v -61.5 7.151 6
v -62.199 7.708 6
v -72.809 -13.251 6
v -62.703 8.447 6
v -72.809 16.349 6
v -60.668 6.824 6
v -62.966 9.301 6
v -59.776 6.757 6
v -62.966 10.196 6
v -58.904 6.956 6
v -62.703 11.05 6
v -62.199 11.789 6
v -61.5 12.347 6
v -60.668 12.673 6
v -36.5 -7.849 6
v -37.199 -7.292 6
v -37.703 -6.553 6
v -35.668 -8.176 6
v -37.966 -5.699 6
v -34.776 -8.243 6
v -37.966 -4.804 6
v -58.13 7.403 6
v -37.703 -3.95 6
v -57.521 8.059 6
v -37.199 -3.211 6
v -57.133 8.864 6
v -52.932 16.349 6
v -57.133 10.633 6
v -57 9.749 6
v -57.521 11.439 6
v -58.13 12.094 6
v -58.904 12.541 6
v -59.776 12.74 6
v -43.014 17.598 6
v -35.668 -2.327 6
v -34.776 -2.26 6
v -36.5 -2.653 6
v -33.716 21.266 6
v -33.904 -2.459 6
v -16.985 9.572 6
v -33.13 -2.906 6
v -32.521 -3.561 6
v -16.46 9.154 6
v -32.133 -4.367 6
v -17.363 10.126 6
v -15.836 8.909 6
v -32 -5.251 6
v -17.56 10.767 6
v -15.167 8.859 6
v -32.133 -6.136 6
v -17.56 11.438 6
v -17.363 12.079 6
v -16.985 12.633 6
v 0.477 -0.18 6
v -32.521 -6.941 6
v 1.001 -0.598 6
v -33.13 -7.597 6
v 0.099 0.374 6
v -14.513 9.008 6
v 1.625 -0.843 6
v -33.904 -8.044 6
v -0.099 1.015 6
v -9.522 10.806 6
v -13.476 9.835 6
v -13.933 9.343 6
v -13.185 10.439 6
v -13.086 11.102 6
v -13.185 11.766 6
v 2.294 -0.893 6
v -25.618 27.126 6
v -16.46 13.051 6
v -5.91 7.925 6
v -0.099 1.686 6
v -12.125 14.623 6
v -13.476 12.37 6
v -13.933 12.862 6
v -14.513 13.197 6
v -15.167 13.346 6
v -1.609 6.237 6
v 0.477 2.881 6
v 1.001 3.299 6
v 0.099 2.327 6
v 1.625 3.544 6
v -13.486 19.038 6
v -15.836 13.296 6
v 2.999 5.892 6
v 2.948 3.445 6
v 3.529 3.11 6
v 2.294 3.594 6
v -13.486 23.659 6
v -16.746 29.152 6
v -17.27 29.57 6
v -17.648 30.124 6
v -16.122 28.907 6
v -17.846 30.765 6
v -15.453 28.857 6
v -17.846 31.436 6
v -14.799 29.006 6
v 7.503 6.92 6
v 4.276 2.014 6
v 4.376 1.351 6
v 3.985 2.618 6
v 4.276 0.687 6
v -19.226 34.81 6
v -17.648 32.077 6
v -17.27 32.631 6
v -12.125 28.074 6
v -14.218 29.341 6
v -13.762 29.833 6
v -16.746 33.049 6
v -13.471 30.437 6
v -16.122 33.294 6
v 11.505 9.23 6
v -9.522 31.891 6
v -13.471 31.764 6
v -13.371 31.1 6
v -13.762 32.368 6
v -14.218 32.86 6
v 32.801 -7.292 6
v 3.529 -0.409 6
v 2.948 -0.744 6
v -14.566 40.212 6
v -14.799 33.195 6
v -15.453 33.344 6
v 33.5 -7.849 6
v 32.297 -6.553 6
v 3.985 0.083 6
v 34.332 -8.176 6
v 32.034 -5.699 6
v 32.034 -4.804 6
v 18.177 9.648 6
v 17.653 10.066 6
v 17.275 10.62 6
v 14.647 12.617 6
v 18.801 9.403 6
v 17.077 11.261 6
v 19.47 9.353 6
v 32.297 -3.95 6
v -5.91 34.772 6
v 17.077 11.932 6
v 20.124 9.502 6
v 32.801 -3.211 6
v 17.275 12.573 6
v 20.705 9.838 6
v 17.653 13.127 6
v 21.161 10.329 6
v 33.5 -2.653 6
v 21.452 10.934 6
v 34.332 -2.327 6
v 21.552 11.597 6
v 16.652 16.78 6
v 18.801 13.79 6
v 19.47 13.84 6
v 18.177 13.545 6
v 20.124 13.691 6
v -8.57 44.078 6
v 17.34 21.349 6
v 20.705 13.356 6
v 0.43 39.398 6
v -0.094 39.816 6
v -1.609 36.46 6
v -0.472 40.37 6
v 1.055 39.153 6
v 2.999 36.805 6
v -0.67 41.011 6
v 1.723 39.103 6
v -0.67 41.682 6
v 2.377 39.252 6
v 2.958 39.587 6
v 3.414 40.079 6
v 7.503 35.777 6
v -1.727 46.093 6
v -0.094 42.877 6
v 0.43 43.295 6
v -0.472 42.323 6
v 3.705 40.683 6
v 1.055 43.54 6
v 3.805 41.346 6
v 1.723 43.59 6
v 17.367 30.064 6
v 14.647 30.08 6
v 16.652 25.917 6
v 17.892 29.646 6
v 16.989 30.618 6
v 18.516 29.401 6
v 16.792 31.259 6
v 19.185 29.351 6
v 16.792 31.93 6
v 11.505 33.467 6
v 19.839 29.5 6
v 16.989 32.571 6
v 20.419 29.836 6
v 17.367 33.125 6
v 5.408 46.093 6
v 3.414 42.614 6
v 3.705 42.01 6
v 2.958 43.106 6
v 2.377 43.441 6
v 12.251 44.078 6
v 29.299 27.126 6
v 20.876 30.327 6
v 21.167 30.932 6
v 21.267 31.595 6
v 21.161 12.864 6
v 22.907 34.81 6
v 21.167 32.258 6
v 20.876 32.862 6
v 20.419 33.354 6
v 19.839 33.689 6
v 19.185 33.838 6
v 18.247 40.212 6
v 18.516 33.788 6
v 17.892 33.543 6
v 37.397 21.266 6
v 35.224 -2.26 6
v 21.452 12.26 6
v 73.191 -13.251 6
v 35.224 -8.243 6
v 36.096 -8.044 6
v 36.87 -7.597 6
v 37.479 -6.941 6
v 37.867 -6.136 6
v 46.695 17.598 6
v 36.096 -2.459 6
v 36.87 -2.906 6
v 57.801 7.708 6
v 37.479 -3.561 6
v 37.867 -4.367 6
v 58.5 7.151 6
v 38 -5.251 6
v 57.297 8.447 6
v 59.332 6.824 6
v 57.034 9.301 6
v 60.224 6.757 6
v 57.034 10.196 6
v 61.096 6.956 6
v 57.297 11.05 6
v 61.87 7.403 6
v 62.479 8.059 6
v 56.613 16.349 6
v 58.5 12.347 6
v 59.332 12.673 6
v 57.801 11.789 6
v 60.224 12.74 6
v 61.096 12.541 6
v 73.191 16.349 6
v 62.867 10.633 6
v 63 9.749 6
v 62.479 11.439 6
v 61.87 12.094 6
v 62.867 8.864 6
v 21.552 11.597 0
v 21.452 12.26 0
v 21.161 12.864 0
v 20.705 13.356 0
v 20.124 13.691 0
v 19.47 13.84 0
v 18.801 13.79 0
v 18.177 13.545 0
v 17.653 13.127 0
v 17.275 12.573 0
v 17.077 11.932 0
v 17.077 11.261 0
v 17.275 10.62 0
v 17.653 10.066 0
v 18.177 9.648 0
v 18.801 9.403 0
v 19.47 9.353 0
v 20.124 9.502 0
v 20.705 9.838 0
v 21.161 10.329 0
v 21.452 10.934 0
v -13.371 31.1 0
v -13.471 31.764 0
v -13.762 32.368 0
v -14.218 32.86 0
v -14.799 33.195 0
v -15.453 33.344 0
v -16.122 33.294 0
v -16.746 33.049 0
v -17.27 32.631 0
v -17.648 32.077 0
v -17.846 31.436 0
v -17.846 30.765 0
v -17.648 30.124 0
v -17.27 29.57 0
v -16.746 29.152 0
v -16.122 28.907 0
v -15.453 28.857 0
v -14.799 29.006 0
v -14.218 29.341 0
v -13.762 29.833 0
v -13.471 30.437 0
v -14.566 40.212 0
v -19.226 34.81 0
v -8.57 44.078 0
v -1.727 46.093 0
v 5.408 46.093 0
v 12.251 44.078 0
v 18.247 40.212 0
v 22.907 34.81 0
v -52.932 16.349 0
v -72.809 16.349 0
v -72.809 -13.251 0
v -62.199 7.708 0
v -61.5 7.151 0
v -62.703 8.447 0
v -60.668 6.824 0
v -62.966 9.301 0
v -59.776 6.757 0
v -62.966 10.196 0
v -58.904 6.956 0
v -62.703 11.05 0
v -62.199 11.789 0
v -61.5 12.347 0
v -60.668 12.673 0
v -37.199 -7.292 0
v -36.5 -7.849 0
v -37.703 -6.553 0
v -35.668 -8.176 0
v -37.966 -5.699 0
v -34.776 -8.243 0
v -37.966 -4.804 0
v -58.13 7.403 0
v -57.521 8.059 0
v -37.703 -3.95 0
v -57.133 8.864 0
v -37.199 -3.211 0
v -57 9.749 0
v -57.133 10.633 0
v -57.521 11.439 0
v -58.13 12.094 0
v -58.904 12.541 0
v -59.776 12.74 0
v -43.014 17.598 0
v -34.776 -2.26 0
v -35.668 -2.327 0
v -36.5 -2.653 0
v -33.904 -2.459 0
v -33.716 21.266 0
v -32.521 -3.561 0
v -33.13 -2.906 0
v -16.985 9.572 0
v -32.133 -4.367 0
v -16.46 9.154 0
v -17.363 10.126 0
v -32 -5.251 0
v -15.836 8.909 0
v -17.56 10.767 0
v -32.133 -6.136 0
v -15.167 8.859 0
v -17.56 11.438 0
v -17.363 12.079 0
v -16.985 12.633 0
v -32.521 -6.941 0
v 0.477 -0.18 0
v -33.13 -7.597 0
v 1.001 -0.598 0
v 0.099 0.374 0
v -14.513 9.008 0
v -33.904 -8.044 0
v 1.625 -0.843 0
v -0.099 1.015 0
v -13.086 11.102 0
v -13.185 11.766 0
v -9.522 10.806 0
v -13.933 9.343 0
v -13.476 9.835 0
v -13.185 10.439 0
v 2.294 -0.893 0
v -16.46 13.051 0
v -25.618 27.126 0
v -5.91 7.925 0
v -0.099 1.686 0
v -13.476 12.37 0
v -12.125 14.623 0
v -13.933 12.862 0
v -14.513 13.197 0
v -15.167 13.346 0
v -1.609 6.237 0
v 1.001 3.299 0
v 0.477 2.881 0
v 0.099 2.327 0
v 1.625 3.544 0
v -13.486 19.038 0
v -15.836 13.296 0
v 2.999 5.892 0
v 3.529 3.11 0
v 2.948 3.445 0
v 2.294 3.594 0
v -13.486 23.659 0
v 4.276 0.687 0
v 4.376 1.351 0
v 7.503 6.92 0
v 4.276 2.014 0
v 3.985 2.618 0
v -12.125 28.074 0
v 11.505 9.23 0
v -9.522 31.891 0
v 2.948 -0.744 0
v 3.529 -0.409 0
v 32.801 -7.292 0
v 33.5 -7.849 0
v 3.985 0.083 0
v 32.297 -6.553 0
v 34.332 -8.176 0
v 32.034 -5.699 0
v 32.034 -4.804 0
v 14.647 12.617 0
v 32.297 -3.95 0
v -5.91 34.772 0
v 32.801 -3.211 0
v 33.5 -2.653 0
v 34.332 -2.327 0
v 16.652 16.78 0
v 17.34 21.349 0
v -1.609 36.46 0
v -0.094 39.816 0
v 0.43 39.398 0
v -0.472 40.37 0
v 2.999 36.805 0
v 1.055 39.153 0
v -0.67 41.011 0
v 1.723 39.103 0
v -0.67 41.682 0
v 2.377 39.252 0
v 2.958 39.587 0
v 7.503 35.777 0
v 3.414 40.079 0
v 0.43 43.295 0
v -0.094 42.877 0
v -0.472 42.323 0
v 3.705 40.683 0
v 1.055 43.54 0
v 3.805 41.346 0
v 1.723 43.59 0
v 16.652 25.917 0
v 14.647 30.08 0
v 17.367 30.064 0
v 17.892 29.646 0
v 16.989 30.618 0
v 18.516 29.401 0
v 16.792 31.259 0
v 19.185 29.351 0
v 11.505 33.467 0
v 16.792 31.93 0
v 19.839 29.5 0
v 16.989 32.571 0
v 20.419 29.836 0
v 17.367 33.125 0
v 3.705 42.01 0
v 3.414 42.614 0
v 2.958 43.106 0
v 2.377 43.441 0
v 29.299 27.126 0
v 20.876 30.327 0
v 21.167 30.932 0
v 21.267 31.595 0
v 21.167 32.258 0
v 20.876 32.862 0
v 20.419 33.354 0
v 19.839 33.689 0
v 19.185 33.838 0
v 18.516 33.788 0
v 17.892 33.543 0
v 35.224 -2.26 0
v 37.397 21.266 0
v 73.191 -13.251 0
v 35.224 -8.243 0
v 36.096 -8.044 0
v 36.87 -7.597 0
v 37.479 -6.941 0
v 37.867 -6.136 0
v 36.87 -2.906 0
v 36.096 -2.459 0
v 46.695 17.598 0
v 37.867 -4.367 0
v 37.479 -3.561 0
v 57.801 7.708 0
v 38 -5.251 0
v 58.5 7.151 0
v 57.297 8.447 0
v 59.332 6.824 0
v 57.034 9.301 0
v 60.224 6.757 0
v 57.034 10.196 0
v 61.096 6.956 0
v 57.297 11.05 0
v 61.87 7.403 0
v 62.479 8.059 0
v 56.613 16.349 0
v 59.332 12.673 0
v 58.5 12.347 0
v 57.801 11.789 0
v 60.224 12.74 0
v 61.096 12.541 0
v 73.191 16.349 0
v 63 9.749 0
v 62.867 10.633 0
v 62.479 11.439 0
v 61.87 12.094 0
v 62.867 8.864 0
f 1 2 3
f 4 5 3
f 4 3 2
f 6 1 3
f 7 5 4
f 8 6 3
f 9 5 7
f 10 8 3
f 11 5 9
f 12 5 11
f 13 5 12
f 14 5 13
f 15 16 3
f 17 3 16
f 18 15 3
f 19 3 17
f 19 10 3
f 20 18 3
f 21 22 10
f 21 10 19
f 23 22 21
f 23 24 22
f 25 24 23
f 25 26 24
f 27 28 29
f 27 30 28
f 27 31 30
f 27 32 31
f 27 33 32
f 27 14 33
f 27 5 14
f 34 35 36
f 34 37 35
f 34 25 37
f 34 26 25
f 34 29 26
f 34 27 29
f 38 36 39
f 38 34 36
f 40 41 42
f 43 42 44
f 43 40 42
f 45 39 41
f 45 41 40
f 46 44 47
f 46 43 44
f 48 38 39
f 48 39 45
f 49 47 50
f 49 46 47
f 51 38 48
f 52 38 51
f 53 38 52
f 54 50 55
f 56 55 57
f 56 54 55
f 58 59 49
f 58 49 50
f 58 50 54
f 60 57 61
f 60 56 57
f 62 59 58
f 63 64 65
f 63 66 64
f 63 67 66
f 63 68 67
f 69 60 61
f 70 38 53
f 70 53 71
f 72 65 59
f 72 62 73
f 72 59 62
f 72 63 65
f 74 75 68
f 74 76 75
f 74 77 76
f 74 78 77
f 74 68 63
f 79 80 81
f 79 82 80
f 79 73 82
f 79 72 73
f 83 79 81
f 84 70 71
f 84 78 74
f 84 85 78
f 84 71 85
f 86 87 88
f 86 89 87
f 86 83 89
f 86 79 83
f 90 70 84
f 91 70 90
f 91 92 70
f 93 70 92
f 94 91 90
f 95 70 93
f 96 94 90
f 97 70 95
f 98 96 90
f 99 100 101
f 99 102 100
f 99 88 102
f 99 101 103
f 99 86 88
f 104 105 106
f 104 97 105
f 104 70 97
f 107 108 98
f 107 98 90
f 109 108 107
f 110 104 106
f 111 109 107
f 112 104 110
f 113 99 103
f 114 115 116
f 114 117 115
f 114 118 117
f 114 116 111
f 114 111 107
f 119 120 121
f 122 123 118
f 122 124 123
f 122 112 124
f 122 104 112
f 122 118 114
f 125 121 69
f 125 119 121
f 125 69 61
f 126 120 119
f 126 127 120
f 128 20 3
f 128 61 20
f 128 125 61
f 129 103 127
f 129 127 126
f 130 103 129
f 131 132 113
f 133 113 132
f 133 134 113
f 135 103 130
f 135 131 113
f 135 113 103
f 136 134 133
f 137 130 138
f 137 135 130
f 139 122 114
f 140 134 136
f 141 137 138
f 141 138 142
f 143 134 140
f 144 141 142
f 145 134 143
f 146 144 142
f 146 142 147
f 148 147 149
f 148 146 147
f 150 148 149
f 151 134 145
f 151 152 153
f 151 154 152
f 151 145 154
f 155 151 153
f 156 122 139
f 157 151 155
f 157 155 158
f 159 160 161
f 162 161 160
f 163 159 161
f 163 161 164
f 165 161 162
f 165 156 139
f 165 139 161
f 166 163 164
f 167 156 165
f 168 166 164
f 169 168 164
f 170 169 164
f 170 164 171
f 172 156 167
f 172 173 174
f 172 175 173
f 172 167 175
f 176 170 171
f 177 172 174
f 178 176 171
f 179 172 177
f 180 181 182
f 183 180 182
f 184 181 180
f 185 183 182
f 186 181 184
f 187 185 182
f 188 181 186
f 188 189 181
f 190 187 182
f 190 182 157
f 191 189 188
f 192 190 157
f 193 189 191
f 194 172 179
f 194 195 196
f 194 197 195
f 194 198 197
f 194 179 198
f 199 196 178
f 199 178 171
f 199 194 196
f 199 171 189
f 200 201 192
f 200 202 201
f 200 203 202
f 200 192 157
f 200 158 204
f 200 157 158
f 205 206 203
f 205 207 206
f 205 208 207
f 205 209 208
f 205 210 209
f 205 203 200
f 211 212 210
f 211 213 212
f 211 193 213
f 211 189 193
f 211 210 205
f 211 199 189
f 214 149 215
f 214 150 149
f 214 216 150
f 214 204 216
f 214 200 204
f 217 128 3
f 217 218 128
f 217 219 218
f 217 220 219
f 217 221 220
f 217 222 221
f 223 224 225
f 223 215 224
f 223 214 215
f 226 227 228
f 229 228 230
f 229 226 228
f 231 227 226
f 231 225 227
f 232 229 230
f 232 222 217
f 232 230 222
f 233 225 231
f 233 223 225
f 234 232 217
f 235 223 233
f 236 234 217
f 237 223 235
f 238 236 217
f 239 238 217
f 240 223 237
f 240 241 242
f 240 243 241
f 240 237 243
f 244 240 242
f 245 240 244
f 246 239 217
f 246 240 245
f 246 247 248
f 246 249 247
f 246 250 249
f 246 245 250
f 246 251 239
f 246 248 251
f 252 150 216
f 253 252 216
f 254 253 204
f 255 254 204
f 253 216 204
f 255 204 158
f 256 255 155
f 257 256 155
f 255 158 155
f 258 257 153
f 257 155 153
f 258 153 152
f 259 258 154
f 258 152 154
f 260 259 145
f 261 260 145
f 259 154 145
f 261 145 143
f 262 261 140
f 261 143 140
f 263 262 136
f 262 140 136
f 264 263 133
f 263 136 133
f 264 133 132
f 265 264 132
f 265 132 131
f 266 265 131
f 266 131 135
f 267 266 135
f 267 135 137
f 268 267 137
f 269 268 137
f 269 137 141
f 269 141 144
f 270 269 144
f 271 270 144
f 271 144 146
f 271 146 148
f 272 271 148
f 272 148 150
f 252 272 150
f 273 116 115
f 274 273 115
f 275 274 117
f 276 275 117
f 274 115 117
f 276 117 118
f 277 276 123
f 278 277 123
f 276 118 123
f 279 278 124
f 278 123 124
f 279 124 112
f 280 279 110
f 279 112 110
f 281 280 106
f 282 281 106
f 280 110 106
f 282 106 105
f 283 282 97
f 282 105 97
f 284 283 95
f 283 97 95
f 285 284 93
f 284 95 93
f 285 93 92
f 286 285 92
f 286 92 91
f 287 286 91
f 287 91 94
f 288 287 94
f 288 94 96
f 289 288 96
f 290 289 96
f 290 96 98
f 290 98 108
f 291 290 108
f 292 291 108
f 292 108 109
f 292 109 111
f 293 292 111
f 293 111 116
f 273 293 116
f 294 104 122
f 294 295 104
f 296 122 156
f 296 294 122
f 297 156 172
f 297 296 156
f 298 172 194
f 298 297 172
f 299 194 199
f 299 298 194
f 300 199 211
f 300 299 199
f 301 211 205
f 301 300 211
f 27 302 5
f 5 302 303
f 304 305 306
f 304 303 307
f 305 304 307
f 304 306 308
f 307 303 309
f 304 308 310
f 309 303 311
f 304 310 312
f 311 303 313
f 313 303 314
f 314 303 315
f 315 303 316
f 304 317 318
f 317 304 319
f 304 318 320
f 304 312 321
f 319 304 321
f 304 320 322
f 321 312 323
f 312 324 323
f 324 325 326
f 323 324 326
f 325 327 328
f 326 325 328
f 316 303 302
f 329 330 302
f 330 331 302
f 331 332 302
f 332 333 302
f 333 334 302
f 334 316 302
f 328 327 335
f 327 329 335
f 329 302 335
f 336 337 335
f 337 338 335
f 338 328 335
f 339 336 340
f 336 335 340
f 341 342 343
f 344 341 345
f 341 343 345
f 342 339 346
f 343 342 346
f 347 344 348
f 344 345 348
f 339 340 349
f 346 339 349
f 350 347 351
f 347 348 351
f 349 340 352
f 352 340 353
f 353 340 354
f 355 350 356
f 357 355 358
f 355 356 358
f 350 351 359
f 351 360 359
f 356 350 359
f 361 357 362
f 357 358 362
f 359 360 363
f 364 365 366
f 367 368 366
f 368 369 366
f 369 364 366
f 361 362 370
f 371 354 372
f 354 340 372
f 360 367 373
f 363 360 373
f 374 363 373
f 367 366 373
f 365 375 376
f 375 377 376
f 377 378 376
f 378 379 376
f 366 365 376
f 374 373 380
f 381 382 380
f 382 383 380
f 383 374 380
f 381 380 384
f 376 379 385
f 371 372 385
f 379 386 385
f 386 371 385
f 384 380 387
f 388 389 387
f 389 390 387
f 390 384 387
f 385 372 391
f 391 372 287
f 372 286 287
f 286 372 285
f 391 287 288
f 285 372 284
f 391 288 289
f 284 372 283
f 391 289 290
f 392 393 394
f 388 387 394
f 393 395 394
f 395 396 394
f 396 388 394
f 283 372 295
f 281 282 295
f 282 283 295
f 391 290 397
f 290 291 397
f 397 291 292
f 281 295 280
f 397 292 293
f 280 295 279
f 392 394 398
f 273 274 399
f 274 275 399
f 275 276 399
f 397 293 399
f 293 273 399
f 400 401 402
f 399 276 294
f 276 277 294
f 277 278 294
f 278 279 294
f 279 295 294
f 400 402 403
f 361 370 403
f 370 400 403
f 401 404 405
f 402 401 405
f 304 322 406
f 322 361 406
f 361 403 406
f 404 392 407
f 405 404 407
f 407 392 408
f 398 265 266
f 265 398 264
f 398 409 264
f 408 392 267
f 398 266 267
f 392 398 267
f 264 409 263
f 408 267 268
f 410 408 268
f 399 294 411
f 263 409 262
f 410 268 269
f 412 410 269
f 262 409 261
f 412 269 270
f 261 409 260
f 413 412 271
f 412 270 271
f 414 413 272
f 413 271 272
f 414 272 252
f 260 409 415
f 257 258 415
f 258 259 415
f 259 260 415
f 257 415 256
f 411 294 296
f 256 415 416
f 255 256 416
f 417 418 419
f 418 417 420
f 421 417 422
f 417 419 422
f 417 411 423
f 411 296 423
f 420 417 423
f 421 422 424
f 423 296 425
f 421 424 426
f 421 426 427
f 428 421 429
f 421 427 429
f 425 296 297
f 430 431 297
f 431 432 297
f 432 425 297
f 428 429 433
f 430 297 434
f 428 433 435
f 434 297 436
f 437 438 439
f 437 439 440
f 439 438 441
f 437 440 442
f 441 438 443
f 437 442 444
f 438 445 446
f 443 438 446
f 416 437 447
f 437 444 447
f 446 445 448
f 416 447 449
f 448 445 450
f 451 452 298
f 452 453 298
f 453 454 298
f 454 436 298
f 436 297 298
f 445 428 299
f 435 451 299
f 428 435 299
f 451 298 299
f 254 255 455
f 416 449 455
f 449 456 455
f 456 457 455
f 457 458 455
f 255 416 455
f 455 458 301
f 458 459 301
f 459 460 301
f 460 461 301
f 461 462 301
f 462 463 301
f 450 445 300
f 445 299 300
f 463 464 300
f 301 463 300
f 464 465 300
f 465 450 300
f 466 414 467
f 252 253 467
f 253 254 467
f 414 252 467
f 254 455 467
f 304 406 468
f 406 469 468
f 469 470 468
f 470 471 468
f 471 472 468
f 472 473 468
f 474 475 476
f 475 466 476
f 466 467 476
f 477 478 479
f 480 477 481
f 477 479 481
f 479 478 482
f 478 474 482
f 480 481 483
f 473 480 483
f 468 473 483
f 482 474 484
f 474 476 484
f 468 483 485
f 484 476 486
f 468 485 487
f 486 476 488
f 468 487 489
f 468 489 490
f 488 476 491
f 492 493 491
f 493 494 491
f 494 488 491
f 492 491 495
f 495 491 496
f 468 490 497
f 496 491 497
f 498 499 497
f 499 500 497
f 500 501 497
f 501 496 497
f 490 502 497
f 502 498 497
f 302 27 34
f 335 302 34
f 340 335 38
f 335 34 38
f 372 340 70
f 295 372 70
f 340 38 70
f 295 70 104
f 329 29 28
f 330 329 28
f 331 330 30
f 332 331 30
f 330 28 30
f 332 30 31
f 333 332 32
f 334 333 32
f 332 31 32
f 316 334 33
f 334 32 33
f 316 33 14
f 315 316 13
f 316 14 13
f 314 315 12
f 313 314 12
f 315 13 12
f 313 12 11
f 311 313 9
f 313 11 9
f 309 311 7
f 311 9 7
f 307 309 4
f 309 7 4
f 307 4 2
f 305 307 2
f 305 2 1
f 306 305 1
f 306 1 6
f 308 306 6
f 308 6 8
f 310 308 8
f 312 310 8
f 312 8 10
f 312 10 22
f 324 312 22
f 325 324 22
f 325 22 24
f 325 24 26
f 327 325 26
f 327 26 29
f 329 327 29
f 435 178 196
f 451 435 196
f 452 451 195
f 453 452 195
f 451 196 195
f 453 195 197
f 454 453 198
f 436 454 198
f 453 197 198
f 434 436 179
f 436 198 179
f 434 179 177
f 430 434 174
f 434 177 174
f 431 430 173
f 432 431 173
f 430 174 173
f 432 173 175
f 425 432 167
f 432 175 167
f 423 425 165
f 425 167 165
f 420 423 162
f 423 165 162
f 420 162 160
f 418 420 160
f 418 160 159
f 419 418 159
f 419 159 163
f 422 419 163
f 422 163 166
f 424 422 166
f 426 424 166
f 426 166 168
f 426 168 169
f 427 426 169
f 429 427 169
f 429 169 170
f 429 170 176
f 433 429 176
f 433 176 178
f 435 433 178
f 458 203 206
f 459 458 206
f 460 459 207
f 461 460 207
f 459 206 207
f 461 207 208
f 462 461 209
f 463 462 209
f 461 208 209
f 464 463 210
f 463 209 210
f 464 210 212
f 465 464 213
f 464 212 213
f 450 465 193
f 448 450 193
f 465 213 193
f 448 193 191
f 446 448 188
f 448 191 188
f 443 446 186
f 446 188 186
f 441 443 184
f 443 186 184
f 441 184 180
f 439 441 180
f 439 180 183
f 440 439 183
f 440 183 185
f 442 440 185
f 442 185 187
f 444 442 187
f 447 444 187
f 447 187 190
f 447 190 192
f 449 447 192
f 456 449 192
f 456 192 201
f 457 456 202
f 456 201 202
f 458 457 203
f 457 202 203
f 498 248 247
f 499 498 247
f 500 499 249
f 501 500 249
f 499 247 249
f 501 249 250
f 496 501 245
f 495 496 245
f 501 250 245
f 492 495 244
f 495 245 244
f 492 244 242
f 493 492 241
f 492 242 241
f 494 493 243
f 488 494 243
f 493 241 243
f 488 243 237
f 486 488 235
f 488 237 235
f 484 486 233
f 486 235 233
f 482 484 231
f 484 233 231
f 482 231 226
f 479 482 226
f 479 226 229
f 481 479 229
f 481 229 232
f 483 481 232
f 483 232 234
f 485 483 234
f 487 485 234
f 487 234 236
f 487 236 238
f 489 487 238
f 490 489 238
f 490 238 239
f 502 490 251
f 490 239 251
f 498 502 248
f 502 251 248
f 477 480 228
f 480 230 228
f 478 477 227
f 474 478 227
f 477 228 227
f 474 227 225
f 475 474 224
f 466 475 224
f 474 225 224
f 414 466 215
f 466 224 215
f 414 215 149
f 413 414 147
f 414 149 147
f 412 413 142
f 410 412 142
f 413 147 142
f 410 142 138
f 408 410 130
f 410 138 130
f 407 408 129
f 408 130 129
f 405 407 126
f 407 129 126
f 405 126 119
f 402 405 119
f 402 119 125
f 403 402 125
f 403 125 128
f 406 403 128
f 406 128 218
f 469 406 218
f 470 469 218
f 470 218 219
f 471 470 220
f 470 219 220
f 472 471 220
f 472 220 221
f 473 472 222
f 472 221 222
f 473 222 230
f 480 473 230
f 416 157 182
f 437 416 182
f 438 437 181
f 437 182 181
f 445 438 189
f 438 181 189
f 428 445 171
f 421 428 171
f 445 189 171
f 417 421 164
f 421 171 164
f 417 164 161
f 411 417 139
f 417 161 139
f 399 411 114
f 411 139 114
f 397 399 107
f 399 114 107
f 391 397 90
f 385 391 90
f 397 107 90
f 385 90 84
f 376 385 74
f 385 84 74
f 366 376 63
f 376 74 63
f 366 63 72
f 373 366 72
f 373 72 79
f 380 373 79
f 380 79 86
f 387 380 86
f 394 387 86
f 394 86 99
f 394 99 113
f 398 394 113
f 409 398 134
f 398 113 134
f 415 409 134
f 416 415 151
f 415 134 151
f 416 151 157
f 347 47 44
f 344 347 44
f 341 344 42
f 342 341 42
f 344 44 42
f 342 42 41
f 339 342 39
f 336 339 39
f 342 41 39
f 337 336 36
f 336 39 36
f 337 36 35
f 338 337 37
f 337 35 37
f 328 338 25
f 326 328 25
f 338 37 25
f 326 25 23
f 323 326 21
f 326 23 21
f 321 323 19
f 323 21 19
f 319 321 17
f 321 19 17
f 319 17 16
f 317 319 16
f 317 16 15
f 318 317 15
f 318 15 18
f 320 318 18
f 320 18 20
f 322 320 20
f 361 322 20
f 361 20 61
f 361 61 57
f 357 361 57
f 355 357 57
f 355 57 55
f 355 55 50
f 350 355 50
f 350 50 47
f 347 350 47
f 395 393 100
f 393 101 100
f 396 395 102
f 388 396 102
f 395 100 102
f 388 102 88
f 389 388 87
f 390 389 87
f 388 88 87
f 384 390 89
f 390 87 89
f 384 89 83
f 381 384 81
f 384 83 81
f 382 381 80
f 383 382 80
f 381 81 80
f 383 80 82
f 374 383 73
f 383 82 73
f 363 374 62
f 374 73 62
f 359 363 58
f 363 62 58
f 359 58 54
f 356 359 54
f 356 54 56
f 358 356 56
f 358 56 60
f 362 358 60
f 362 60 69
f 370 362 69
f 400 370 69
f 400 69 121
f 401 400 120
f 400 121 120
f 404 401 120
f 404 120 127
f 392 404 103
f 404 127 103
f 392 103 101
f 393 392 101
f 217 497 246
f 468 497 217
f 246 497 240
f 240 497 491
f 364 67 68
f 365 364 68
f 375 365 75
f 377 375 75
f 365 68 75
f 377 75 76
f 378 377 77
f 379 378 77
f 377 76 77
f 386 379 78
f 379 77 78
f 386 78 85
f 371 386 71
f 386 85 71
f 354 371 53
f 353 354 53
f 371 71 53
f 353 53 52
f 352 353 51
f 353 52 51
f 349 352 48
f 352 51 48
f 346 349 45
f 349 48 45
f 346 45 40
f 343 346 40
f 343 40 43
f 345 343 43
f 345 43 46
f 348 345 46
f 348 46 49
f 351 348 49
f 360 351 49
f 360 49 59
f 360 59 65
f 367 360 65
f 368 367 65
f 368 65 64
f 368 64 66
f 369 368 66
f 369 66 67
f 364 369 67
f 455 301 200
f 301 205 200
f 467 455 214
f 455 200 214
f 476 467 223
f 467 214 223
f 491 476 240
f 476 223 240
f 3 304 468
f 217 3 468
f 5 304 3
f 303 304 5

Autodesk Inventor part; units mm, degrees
ref_plane "YZ Plane" through (0, 0, 0) normal (1, 0, 0) x (0, 1, 0)
ref_plane "XZ Plane" through (0, 0, 0) normal (0, 1, 0) x (-1, 0, 0)
ref_plane "XY Plane" through (0, 0, 0) normal (0, 0, 1) x (1, 0, 0)
sketch "Sketch1" plane through (0, 0, 0) normal (0, 0, 1) x (1, 0, 0)
  line L0 (-72.8091, 16.3486) -> (-72.8091, -13.2514) projected
  line L1 (-72.8091, -13.2514) -> (73.1909, -13.2514) projected
  line L2 (73.1909, -13.2514) -> (73.1909, 16.3486) projected
  line L3 (-72.8091, 16.3486) -> (-72.8091, 50.3486)
  line L4 (-72.8091, 50.3486) -> (73.1909, 50.3486)
  line L5 (73.1909, 50.3486) -> (73.1909, 16.3486)
  point P0 (0, 0)
  dimension "d0" = 34
extrude "Extrusion1" add sketch "Sketch1" along normal blind 6
sketch "Sketch2" plane through (0, 0, 6) normal (0, 0, 1) x (1, 0, 0)
  circle A0 centre (35, -5.2514) radius 3
  circle A1 centre (60, 9.7486) radius 3
  line L0 (0, 0) -> (0, 8.3537) construction
  circle A2 centre (-35, -5.2514) radius 3
  circle A3 centre (-60, 9.7486) radius 3
  line L1 (-72.8091, -13.2514) -> (73.1909, -13.2514) projected
  dimension "d3" = 6
  dimension "d4" = 6
  dimension "d6" = 15
  dimension "d7" = 60
  dimension "d10" = 8
  dimension "d11" = 35
extrude "Extrusion2" cut sketch "Sketch2" against normal through all
sketch "Sketch3" plane through (0, 0, 6) normal (0, 0, 1) x (1, 0, 0)
  circle A0 centre (2.1259, 1.3506) radius 2.25
  circle A1 centre (-15.3355, 11.1025) radius 2.25
  circle A2 centre (-15.6209, 31.1004) radius 2.25
  circle A3 centre (1.5552, 41.3465) radius 2.25
  circle A4 centre (19.0166, 31.5947) radius 2.25
  circle A5 centre (19.302, 11.5967) radius 2.25
  circle A6 centre (1.8405, 21.3486) radius 15 construction
  circle A7 centre (1.8405, 21.3486) radius 15.5
  point P0 (0, 0)
extrude "Extrusion3" cut sketch "Sketch3" against normal through all
sketch "Sketch5" plane through (0, 0, 0) normal (0, 0, -1) x (-1, 0, 0)
  line L0 (-73.1909, 16.3486) -> (-40.1909, 16.3486) projected
  line L1 (42.9091, 16.3486) -> (72.8091, 16.3486) projected
  circle A0 centre (-1.8405, 21.3486) radius 25 construction
  line L2 (-40.1909, 16.3486) -> (-26.3354, 16.3486)
  line L3 (42.9091, 16.3486) -> (22.6544, 16.3486)
  arc A1 (22.6544, 16.3486) -> (-26.3354, 16.3486) centre (-1.8405, 21.3486) ccw
  line L4 (-73.1909, 50.3486) -> (72.8091, 50.3486) projected
  line L5 (-73.1909, 50.3486) -> (72.8091, 50.3486) projected
  line L6 (72.8091, 16.3486) -> (72.8091, 50.3486)
  line L7 (-73.1909, 50.3486) -> (-73.1909, 16.3486)
  line L8 (-73.1909, -13.2514) -> (-73.1909, 50.3486) projected
  point P0 (0, 0)
extrude "Extrusion4" cut sketch "Sketch5" against normal through all
fillet "Fillet2" radius 40 2 edges at (-22.6544, 16.3486, 3) (26.3354, 16.3486, 3)
properties part number "x axis nut support"
